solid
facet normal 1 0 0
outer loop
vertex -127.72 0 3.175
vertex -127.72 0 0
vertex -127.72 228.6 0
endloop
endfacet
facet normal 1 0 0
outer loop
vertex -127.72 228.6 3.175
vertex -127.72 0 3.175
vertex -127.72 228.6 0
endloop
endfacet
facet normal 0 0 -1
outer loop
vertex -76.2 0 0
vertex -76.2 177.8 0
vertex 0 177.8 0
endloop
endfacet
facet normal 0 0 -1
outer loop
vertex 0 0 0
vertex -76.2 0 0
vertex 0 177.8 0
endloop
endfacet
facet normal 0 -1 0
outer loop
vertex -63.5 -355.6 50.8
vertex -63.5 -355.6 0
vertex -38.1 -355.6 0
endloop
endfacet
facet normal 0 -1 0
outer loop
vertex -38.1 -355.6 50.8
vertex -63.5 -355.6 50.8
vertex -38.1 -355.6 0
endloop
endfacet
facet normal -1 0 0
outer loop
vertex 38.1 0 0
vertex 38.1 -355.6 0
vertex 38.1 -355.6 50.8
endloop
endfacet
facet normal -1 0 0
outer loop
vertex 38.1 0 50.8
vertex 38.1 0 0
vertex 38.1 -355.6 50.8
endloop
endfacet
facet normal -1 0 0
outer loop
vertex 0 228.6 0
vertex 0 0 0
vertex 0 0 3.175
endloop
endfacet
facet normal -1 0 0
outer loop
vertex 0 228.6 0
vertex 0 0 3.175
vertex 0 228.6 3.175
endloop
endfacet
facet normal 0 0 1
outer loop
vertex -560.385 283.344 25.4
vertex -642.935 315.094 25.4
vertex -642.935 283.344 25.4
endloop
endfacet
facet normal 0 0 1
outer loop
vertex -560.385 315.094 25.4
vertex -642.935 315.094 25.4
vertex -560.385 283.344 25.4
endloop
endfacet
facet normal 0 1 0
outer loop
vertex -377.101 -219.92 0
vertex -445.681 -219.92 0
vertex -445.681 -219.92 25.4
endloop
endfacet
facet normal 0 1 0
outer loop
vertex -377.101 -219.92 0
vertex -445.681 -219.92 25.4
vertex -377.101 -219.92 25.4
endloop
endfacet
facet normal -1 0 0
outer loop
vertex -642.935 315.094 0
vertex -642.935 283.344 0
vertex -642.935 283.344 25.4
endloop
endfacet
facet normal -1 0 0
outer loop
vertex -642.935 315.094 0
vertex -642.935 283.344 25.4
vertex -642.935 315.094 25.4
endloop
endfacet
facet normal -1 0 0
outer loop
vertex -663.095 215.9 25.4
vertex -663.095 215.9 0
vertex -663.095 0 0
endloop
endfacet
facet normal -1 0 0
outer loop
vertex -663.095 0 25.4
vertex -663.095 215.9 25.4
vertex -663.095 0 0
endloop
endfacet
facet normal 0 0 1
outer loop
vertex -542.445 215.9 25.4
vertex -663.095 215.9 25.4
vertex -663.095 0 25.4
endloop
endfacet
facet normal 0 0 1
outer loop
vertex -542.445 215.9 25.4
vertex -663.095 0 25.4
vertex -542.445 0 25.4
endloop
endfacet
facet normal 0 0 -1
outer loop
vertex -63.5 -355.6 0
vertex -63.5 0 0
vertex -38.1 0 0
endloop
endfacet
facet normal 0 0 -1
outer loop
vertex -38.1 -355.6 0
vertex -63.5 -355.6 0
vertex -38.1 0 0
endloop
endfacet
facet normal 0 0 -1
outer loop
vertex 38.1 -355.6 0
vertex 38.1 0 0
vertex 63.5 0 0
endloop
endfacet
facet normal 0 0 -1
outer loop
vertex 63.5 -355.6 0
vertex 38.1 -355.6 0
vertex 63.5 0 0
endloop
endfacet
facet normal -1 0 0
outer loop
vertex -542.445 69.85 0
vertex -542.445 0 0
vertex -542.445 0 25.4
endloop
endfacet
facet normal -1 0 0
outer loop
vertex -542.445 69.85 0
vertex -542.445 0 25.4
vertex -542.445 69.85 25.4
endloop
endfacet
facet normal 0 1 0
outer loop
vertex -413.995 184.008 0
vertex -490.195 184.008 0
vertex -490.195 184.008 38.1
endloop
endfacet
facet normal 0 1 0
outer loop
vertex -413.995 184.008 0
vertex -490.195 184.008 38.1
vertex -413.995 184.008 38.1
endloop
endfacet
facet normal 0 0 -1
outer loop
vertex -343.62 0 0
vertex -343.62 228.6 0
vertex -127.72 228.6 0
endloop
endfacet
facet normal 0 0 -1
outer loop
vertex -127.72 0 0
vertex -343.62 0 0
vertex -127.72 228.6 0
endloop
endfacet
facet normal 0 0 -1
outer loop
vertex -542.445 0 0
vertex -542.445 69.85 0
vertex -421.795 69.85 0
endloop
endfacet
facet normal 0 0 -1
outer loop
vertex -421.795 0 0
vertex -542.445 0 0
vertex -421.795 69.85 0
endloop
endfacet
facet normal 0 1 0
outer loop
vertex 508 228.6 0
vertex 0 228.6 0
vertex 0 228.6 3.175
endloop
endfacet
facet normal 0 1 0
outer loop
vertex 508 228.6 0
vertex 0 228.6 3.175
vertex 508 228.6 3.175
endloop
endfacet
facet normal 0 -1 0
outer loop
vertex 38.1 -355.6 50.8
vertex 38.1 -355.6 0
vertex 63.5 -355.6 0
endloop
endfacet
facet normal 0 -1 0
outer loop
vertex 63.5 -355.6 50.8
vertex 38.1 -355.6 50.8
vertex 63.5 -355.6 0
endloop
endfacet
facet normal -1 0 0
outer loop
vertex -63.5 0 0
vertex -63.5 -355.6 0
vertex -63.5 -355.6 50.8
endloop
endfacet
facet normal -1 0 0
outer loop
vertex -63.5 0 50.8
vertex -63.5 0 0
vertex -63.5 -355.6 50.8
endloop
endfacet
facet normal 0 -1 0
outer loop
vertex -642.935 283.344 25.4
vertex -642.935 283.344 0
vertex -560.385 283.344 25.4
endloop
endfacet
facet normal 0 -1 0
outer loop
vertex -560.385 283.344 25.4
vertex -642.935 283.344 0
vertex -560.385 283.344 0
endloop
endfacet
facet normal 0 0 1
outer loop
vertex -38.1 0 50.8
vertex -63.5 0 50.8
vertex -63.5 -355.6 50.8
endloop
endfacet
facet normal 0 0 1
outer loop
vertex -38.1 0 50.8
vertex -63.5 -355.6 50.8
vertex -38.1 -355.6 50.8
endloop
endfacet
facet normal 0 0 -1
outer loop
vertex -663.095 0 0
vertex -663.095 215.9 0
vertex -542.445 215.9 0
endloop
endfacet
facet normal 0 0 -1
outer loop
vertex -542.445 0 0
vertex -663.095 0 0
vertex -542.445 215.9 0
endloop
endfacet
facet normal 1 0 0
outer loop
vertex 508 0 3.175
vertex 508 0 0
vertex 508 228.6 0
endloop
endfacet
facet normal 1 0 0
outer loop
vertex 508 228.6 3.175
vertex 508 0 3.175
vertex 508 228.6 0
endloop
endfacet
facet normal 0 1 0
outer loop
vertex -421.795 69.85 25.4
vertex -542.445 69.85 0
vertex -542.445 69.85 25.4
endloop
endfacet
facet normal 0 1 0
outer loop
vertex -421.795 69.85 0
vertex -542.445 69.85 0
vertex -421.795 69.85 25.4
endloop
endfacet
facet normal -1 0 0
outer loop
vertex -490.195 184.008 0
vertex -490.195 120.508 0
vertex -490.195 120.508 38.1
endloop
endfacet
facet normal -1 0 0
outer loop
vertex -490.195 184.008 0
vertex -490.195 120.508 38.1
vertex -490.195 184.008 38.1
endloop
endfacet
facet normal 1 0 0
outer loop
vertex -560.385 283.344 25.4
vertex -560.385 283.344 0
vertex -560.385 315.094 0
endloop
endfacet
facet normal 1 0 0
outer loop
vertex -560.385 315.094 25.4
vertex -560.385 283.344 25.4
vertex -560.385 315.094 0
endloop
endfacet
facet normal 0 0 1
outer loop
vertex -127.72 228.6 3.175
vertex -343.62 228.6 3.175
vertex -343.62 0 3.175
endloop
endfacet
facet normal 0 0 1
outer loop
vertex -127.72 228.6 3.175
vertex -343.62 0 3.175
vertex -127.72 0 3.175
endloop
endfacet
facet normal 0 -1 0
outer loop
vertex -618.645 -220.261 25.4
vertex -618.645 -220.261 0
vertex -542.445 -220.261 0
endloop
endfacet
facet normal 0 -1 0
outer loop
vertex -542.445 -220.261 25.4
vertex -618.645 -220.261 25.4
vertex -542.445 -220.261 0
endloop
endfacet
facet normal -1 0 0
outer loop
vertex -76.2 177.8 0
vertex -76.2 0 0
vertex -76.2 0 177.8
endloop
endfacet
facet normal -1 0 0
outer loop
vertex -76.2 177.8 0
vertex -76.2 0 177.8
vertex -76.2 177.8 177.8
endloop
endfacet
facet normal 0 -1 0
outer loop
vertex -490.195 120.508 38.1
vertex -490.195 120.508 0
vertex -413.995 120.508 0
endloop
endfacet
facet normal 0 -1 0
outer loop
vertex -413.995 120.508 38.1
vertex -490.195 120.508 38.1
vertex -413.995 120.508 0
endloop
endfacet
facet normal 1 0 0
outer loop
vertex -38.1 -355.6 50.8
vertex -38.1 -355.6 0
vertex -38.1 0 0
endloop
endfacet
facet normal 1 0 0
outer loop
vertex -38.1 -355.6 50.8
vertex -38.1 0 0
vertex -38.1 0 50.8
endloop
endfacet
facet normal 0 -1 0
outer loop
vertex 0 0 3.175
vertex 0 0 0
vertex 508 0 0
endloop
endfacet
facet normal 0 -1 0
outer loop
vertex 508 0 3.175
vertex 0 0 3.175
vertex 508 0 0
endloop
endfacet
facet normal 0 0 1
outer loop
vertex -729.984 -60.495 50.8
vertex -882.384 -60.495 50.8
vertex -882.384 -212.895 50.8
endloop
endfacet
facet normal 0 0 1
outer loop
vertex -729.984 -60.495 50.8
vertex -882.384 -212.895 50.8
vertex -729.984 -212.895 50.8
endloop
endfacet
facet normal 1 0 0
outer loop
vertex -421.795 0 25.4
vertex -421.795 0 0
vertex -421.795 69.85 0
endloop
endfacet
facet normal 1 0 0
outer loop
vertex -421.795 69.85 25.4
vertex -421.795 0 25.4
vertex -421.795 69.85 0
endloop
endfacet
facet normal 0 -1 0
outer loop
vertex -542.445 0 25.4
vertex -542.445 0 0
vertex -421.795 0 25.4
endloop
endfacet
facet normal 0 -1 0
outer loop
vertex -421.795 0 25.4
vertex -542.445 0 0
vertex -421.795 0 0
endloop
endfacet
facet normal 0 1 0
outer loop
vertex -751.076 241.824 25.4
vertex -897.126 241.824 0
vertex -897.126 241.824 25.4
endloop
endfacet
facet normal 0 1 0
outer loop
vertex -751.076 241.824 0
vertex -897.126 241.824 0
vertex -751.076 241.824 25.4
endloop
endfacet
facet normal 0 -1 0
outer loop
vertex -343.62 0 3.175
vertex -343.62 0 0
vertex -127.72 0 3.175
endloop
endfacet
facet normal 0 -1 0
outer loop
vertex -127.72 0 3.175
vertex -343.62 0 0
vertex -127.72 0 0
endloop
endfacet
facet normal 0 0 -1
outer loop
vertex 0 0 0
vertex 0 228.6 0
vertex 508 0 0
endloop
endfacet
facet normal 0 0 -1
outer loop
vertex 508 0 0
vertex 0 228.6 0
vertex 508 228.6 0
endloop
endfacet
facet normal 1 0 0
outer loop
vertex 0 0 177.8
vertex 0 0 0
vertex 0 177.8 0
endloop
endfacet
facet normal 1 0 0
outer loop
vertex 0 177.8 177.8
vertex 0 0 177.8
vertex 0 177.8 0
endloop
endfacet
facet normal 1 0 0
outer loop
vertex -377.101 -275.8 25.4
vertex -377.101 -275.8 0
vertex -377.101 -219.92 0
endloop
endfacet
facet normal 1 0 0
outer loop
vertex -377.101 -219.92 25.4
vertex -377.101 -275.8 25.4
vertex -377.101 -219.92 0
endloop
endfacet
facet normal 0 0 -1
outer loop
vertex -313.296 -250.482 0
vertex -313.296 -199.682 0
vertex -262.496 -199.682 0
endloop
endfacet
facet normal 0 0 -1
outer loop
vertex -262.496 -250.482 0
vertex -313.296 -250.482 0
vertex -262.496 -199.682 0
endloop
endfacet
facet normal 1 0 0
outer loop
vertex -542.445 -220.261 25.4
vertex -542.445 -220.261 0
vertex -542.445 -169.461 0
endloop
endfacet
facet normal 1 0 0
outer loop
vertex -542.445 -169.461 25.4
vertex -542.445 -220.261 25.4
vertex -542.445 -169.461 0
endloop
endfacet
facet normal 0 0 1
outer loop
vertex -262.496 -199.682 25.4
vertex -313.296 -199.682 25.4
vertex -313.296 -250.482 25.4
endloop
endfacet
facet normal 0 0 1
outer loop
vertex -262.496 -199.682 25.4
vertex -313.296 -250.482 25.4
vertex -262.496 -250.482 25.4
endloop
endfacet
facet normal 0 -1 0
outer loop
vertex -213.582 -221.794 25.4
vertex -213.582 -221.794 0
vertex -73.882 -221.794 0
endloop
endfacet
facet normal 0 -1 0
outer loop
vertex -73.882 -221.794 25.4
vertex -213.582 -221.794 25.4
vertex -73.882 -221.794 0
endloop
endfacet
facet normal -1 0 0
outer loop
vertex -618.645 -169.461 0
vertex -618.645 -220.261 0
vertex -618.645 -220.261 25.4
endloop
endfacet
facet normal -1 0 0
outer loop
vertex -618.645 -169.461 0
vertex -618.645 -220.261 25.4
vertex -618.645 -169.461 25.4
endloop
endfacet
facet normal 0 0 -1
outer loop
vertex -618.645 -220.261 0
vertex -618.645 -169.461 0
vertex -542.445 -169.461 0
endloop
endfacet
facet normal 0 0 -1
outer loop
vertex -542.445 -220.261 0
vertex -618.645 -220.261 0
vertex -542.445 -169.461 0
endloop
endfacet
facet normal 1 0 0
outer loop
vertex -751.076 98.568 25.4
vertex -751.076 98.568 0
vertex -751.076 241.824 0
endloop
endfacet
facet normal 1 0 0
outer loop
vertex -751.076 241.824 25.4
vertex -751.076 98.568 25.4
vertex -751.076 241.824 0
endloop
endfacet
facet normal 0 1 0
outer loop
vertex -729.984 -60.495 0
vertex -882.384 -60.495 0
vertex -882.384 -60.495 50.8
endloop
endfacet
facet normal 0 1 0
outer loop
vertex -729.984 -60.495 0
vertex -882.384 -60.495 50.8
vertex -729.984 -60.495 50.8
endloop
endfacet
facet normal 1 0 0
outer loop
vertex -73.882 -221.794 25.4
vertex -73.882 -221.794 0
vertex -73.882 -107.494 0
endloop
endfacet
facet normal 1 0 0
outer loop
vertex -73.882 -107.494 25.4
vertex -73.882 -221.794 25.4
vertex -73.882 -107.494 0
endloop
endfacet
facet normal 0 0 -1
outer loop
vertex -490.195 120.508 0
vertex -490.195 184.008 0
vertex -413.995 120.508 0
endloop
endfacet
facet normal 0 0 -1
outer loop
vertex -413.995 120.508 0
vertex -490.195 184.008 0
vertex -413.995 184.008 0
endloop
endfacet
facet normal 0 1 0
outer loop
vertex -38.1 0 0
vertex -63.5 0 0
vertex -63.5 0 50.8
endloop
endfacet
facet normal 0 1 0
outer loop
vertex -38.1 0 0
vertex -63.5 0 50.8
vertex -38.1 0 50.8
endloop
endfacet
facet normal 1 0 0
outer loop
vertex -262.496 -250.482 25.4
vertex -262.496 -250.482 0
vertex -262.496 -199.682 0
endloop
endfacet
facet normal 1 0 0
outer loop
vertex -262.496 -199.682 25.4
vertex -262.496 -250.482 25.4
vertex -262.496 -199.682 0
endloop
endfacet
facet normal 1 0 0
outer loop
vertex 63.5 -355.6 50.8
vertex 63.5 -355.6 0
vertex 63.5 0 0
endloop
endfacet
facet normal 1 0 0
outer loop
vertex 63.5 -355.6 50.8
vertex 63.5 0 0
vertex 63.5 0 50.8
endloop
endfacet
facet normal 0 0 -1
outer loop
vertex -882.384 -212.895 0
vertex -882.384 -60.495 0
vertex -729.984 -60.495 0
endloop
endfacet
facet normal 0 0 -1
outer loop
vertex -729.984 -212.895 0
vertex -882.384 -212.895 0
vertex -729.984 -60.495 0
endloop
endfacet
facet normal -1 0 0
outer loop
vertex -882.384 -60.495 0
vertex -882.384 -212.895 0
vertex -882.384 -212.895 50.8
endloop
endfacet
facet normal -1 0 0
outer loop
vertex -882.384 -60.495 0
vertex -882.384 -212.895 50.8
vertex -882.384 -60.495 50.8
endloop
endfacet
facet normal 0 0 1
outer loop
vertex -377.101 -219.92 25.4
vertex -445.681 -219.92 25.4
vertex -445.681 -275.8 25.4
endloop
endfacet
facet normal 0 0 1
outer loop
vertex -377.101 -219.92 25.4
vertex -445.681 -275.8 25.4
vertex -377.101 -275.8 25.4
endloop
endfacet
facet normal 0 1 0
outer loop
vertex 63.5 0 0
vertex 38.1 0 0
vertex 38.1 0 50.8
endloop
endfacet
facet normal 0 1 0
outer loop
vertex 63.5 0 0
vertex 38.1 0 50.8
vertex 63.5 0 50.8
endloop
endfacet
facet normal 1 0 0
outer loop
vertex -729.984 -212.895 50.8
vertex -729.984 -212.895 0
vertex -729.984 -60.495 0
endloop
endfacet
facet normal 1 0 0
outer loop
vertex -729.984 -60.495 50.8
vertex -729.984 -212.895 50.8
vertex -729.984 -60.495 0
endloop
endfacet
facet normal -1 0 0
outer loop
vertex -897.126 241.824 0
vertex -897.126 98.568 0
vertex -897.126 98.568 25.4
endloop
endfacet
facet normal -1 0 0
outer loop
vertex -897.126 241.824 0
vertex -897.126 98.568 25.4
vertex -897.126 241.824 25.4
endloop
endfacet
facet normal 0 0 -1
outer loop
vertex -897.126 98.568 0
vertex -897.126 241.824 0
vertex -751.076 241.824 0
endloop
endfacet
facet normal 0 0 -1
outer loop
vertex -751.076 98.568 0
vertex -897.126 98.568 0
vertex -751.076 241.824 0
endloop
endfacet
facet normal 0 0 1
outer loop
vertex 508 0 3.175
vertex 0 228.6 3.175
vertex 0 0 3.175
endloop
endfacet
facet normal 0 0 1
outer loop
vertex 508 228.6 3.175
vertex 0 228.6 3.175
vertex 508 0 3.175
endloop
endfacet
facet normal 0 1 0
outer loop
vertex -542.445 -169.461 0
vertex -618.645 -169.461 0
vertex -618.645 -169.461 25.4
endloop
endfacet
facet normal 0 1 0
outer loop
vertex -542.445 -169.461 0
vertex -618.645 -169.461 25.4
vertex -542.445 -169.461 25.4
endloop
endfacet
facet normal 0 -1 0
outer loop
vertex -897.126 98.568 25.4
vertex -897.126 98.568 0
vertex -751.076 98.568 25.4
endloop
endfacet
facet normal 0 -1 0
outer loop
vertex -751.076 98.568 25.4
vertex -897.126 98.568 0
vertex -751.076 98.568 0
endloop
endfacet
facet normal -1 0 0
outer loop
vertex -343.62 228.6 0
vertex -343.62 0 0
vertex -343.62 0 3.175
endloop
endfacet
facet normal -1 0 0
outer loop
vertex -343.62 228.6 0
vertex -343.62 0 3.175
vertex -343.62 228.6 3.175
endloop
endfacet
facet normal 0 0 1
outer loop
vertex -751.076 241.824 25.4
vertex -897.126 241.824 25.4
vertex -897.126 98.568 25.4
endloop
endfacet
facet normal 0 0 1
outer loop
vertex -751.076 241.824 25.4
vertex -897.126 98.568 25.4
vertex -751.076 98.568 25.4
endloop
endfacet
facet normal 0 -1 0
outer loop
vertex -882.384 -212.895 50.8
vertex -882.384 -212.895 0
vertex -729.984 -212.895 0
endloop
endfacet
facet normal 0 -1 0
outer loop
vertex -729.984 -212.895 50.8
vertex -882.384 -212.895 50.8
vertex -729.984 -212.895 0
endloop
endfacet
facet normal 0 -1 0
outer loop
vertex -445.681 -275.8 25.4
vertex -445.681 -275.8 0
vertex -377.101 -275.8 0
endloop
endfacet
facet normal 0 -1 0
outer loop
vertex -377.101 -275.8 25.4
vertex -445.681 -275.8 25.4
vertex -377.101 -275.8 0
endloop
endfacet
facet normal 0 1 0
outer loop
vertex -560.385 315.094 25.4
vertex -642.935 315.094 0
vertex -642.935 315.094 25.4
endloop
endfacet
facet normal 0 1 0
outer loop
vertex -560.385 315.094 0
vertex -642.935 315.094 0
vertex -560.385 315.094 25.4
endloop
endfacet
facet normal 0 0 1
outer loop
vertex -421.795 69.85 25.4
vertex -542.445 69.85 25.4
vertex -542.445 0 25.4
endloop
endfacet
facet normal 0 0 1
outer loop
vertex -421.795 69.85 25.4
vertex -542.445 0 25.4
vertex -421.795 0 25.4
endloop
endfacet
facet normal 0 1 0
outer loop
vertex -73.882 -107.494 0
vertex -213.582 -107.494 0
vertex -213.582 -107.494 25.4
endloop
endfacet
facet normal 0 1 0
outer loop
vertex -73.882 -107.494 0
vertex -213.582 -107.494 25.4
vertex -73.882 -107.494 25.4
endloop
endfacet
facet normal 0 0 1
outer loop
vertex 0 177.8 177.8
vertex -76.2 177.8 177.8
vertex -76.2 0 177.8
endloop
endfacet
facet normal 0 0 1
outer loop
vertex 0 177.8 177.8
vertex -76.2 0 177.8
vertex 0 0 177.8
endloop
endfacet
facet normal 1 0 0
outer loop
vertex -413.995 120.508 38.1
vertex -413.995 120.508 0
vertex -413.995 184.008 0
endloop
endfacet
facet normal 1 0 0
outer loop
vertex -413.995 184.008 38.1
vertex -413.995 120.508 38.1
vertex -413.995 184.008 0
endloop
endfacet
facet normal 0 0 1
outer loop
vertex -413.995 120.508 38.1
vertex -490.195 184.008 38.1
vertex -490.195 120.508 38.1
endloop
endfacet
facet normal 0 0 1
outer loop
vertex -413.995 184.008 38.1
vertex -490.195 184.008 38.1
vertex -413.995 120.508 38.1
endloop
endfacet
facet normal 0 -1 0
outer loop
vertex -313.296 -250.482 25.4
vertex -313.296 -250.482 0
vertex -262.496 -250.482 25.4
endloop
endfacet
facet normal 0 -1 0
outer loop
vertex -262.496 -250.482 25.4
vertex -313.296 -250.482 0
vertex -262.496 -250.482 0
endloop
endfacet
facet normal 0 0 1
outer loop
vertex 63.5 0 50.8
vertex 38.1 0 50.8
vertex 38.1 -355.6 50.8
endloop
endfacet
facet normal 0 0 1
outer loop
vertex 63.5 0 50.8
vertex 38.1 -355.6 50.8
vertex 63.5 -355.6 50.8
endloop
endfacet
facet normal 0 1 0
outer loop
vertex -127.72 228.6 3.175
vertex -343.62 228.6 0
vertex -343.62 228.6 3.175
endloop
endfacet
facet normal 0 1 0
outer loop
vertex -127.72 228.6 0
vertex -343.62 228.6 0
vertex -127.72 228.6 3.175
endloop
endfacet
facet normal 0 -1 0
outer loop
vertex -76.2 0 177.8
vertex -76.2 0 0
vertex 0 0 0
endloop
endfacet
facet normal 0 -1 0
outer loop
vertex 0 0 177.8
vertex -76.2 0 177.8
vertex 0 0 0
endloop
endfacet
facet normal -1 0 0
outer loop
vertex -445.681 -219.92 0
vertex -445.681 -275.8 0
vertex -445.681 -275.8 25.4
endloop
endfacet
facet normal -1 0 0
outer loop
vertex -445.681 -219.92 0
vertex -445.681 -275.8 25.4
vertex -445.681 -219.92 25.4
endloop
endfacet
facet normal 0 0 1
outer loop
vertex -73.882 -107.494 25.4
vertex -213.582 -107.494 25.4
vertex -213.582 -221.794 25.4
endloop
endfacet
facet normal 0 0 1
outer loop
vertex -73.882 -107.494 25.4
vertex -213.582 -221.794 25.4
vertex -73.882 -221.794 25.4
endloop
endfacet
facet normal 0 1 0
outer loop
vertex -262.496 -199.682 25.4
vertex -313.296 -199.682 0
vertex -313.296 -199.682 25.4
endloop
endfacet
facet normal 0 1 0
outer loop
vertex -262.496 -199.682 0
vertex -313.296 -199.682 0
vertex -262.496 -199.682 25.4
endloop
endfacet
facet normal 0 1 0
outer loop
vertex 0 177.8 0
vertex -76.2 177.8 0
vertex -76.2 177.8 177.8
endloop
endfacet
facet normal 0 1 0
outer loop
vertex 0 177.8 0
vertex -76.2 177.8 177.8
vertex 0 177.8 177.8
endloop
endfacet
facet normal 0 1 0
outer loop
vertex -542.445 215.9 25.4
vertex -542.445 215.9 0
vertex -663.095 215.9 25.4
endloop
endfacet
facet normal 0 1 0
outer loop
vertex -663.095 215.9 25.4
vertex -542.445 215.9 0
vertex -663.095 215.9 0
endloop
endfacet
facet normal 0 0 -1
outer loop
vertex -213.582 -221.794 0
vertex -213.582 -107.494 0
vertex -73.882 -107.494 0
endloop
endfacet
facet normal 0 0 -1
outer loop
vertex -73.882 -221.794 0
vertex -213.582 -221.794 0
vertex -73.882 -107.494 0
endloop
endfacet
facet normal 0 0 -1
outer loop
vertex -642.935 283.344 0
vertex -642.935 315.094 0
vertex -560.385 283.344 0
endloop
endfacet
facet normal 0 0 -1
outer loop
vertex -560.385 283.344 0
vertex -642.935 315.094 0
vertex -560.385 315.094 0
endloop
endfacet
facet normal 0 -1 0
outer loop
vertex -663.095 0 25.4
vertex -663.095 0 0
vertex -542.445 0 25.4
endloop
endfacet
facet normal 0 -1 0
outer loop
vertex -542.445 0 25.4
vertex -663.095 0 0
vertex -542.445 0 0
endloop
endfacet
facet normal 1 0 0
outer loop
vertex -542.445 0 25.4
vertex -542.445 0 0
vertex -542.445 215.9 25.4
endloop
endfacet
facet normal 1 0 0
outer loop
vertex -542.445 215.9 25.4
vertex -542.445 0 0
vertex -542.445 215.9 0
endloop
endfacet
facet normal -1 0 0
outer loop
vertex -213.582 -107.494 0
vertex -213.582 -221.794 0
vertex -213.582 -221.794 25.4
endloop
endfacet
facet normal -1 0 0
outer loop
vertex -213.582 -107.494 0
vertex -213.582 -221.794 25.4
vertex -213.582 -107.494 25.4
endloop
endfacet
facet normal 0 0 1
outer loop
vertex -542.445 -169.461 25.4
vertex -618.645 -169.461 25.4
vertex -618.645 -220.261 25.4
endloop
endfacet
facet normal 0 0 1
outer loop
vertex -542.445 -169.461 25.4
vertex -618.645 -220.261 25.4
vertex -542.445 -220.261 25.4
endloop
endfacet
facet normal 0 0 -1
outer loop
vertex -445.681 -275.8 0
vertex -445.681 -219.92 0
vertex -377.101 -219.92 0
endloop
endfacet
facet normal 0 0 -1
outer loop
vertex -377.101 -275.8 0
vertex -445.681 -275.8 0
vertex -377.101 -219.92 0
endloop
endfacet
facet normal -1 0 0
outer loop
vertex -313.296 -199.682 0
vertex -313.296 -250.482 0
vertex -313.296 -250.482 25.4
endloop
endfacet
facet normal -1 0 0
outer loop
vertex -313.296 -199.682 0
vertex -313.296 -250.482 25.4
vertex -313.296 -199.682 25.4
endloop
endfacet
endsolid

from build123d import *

# Parameters (mm, degrees)
F0_W      = 25.4
F0_H      = 50.8
F1_DEPTH  = 355.6
F2_W      = 508
F2_H      = 228.6
F2_W_2    = 215.9
F3_DEPTH  = 3.175
F4_W      = 76.2
F4_H      = 177.8
F5_DEPTH  = 177.8
F2_W_3    = 120.65
F2_H_2    = 69.85
F6_DEPTH  = 25.4
F2_W_4    = 76.2
F2_H_3    = 63.5
F7_DEPTH  = 38.1
F2_W_5    = 146.05
F2_H_4    = 143.256
F8_DEPTH  = 25.4
F2_W_6    = 82.55
F2_H_5    = 31.75
F9_DEPTH  = 25.4
F10_DEPTH = 25.4
F2_W_7    = 50.8
F2_H_6    = 50.8
F11_DEPTH = 25.4
F2_W_8    = 68.58
F2_H_7    = 55.88
F12_DEPTH = 25.4
F13_DEPTH = 25.4
F2_W_9    = 152.4
F2_H_8    = 152.4
F14_DEPTH = 50.8
F2_W_10   = 139.7
F2_H_9    = 114.3
F15_DEPTH = 25.4


with BuildPart() as f1:
    # F0 (on Front) → F1 (new body)
    with BuildSketch(Plane.XZ):
        with Locations((-50.8, 25.4)):
            Rectangle(F0_W, F0_H)
        with Locations((50.8, 25.4)):
            Rectangle(F0_W, F0_H)
    extrude(amount=F1_DEPTH)


with BuildPart() as f3:
    # F2 (on Top) → F3 (new body)
    with BuildSketch(Plane.XY):
        with Locations((254, 114.3)):
            Rectangle(F2_W, F2_H)
        with Locations((-235.669585, 114.3)):
            Rectangle(F2_W_2, F2_H)
    extrude(amount=F3_DEPTH)


with BuildPart() as f5:
    # F4 (on Top) → F5 (new body)
    with BuildSketch(Plane.XY):
        with Locations((-38.1, 88.9)):
            Rectangle(F4_W, F4_H)
    extrude(amount=F5_DEPTH)


with BuildPart() as f6:
    # F2 (on Top) → F6 (new body)
    with BuildSketch(Plane.XY):
        with Locations((-482.119997, 34.925)):
            Rectangle(F2_W_3, F2_H_2)
    extrude(amount=F6_DEPTH)


with BuildPart() as f7:
    # F2 (on Top) → F7 (new body)
    with BuildSketch(Plane.XY):
        with Locations((-452.095185, 152.258142)):
            Rectangle(F2_W_4, F2_H_3)
    extrude(amount=F7_DEPTH)


with BuildPart() as f8:
    # F2 (on Top) → F8 (new body)
    with BuildSketch(Plane.XY):
        with Locations((-824.1009, 170.196447)):
            Rectangle(F2_W_5, F2_H_4)
    extrude(amount=F8_DEPTH)


with BuildPart() as f9:
    # F2 (on Top) → F9 (new body)
    with BuildSketch(Plane.XY):
        with Locations((-601.659501, 299.218554)):
            Rectangle(F2_W_6, F2_H_5)
    extrude(amount=F9_DEPTH)


with BuildPart() as f10:
    # F2 (on Top) → F10 (new body)
    with BuildSketch(Plane.XY):
        Polygon((-542.444997, 0), (-542.444997, 69.85), (-542.444997, 215.9), (-663.094997, 215.9), (-663.094997, 0), align=None)
    extrude(amount=F10_DEPTH)


with BuildPart() as f11:
    # F2 (on Top) → F11 (new body)
    with BuildSketch(Plane.XY):
        with Locations((-287.89599, -225.081844)):
            Rectangle(F2_W_7, F2_H_6)
    extrude(amount=F11_DEPTH)


with BuildPart() as f12:
    # F2 (on Top) → F12 (new body)
    with BuildSketch(Plane.XY):
        with Locations((-411.390529, -247.859632)):
            Rectangle(F2_W_8, F2_H_7)
    extrude(amount=F12_DEPTH)


with BuildPart() as f13:
    # F2 (on Top) → F13 (new body)
    with BuildSketch(Plane.XY):
        with Locations((-580.544997, -194.860784)):
            Rectangle(F2_W_4, F2_H_6)
    extrude(amount=F13_DEPTH)


with BuildPart() as f14:
    # F2 (on Top) → F14 (new body)
    with BuildSketch(Plane.XY):
        with Locations((-806.183883, -136.694991)):
            Rectangle(F2_W_9, F2_H_8)
    extrude(amount=F14_DEPTH)


with BuildPart() as f15:
    # F2 (on Top) → F15 (new body)
    with BuildSketch(Plane.XY):
        with Locations((-143.731607, -164.644128)):
            Rectangle(F2_W_10, F2_H_9)
    extrude(amount=F15_DEPTH)


solid = Compound([f1.part, f3.part, f5.part, f6.part, f7.part, f8.part, f9.part, f10.part, f11.part, f12.part, f13.part, f14.part, f15.part])
